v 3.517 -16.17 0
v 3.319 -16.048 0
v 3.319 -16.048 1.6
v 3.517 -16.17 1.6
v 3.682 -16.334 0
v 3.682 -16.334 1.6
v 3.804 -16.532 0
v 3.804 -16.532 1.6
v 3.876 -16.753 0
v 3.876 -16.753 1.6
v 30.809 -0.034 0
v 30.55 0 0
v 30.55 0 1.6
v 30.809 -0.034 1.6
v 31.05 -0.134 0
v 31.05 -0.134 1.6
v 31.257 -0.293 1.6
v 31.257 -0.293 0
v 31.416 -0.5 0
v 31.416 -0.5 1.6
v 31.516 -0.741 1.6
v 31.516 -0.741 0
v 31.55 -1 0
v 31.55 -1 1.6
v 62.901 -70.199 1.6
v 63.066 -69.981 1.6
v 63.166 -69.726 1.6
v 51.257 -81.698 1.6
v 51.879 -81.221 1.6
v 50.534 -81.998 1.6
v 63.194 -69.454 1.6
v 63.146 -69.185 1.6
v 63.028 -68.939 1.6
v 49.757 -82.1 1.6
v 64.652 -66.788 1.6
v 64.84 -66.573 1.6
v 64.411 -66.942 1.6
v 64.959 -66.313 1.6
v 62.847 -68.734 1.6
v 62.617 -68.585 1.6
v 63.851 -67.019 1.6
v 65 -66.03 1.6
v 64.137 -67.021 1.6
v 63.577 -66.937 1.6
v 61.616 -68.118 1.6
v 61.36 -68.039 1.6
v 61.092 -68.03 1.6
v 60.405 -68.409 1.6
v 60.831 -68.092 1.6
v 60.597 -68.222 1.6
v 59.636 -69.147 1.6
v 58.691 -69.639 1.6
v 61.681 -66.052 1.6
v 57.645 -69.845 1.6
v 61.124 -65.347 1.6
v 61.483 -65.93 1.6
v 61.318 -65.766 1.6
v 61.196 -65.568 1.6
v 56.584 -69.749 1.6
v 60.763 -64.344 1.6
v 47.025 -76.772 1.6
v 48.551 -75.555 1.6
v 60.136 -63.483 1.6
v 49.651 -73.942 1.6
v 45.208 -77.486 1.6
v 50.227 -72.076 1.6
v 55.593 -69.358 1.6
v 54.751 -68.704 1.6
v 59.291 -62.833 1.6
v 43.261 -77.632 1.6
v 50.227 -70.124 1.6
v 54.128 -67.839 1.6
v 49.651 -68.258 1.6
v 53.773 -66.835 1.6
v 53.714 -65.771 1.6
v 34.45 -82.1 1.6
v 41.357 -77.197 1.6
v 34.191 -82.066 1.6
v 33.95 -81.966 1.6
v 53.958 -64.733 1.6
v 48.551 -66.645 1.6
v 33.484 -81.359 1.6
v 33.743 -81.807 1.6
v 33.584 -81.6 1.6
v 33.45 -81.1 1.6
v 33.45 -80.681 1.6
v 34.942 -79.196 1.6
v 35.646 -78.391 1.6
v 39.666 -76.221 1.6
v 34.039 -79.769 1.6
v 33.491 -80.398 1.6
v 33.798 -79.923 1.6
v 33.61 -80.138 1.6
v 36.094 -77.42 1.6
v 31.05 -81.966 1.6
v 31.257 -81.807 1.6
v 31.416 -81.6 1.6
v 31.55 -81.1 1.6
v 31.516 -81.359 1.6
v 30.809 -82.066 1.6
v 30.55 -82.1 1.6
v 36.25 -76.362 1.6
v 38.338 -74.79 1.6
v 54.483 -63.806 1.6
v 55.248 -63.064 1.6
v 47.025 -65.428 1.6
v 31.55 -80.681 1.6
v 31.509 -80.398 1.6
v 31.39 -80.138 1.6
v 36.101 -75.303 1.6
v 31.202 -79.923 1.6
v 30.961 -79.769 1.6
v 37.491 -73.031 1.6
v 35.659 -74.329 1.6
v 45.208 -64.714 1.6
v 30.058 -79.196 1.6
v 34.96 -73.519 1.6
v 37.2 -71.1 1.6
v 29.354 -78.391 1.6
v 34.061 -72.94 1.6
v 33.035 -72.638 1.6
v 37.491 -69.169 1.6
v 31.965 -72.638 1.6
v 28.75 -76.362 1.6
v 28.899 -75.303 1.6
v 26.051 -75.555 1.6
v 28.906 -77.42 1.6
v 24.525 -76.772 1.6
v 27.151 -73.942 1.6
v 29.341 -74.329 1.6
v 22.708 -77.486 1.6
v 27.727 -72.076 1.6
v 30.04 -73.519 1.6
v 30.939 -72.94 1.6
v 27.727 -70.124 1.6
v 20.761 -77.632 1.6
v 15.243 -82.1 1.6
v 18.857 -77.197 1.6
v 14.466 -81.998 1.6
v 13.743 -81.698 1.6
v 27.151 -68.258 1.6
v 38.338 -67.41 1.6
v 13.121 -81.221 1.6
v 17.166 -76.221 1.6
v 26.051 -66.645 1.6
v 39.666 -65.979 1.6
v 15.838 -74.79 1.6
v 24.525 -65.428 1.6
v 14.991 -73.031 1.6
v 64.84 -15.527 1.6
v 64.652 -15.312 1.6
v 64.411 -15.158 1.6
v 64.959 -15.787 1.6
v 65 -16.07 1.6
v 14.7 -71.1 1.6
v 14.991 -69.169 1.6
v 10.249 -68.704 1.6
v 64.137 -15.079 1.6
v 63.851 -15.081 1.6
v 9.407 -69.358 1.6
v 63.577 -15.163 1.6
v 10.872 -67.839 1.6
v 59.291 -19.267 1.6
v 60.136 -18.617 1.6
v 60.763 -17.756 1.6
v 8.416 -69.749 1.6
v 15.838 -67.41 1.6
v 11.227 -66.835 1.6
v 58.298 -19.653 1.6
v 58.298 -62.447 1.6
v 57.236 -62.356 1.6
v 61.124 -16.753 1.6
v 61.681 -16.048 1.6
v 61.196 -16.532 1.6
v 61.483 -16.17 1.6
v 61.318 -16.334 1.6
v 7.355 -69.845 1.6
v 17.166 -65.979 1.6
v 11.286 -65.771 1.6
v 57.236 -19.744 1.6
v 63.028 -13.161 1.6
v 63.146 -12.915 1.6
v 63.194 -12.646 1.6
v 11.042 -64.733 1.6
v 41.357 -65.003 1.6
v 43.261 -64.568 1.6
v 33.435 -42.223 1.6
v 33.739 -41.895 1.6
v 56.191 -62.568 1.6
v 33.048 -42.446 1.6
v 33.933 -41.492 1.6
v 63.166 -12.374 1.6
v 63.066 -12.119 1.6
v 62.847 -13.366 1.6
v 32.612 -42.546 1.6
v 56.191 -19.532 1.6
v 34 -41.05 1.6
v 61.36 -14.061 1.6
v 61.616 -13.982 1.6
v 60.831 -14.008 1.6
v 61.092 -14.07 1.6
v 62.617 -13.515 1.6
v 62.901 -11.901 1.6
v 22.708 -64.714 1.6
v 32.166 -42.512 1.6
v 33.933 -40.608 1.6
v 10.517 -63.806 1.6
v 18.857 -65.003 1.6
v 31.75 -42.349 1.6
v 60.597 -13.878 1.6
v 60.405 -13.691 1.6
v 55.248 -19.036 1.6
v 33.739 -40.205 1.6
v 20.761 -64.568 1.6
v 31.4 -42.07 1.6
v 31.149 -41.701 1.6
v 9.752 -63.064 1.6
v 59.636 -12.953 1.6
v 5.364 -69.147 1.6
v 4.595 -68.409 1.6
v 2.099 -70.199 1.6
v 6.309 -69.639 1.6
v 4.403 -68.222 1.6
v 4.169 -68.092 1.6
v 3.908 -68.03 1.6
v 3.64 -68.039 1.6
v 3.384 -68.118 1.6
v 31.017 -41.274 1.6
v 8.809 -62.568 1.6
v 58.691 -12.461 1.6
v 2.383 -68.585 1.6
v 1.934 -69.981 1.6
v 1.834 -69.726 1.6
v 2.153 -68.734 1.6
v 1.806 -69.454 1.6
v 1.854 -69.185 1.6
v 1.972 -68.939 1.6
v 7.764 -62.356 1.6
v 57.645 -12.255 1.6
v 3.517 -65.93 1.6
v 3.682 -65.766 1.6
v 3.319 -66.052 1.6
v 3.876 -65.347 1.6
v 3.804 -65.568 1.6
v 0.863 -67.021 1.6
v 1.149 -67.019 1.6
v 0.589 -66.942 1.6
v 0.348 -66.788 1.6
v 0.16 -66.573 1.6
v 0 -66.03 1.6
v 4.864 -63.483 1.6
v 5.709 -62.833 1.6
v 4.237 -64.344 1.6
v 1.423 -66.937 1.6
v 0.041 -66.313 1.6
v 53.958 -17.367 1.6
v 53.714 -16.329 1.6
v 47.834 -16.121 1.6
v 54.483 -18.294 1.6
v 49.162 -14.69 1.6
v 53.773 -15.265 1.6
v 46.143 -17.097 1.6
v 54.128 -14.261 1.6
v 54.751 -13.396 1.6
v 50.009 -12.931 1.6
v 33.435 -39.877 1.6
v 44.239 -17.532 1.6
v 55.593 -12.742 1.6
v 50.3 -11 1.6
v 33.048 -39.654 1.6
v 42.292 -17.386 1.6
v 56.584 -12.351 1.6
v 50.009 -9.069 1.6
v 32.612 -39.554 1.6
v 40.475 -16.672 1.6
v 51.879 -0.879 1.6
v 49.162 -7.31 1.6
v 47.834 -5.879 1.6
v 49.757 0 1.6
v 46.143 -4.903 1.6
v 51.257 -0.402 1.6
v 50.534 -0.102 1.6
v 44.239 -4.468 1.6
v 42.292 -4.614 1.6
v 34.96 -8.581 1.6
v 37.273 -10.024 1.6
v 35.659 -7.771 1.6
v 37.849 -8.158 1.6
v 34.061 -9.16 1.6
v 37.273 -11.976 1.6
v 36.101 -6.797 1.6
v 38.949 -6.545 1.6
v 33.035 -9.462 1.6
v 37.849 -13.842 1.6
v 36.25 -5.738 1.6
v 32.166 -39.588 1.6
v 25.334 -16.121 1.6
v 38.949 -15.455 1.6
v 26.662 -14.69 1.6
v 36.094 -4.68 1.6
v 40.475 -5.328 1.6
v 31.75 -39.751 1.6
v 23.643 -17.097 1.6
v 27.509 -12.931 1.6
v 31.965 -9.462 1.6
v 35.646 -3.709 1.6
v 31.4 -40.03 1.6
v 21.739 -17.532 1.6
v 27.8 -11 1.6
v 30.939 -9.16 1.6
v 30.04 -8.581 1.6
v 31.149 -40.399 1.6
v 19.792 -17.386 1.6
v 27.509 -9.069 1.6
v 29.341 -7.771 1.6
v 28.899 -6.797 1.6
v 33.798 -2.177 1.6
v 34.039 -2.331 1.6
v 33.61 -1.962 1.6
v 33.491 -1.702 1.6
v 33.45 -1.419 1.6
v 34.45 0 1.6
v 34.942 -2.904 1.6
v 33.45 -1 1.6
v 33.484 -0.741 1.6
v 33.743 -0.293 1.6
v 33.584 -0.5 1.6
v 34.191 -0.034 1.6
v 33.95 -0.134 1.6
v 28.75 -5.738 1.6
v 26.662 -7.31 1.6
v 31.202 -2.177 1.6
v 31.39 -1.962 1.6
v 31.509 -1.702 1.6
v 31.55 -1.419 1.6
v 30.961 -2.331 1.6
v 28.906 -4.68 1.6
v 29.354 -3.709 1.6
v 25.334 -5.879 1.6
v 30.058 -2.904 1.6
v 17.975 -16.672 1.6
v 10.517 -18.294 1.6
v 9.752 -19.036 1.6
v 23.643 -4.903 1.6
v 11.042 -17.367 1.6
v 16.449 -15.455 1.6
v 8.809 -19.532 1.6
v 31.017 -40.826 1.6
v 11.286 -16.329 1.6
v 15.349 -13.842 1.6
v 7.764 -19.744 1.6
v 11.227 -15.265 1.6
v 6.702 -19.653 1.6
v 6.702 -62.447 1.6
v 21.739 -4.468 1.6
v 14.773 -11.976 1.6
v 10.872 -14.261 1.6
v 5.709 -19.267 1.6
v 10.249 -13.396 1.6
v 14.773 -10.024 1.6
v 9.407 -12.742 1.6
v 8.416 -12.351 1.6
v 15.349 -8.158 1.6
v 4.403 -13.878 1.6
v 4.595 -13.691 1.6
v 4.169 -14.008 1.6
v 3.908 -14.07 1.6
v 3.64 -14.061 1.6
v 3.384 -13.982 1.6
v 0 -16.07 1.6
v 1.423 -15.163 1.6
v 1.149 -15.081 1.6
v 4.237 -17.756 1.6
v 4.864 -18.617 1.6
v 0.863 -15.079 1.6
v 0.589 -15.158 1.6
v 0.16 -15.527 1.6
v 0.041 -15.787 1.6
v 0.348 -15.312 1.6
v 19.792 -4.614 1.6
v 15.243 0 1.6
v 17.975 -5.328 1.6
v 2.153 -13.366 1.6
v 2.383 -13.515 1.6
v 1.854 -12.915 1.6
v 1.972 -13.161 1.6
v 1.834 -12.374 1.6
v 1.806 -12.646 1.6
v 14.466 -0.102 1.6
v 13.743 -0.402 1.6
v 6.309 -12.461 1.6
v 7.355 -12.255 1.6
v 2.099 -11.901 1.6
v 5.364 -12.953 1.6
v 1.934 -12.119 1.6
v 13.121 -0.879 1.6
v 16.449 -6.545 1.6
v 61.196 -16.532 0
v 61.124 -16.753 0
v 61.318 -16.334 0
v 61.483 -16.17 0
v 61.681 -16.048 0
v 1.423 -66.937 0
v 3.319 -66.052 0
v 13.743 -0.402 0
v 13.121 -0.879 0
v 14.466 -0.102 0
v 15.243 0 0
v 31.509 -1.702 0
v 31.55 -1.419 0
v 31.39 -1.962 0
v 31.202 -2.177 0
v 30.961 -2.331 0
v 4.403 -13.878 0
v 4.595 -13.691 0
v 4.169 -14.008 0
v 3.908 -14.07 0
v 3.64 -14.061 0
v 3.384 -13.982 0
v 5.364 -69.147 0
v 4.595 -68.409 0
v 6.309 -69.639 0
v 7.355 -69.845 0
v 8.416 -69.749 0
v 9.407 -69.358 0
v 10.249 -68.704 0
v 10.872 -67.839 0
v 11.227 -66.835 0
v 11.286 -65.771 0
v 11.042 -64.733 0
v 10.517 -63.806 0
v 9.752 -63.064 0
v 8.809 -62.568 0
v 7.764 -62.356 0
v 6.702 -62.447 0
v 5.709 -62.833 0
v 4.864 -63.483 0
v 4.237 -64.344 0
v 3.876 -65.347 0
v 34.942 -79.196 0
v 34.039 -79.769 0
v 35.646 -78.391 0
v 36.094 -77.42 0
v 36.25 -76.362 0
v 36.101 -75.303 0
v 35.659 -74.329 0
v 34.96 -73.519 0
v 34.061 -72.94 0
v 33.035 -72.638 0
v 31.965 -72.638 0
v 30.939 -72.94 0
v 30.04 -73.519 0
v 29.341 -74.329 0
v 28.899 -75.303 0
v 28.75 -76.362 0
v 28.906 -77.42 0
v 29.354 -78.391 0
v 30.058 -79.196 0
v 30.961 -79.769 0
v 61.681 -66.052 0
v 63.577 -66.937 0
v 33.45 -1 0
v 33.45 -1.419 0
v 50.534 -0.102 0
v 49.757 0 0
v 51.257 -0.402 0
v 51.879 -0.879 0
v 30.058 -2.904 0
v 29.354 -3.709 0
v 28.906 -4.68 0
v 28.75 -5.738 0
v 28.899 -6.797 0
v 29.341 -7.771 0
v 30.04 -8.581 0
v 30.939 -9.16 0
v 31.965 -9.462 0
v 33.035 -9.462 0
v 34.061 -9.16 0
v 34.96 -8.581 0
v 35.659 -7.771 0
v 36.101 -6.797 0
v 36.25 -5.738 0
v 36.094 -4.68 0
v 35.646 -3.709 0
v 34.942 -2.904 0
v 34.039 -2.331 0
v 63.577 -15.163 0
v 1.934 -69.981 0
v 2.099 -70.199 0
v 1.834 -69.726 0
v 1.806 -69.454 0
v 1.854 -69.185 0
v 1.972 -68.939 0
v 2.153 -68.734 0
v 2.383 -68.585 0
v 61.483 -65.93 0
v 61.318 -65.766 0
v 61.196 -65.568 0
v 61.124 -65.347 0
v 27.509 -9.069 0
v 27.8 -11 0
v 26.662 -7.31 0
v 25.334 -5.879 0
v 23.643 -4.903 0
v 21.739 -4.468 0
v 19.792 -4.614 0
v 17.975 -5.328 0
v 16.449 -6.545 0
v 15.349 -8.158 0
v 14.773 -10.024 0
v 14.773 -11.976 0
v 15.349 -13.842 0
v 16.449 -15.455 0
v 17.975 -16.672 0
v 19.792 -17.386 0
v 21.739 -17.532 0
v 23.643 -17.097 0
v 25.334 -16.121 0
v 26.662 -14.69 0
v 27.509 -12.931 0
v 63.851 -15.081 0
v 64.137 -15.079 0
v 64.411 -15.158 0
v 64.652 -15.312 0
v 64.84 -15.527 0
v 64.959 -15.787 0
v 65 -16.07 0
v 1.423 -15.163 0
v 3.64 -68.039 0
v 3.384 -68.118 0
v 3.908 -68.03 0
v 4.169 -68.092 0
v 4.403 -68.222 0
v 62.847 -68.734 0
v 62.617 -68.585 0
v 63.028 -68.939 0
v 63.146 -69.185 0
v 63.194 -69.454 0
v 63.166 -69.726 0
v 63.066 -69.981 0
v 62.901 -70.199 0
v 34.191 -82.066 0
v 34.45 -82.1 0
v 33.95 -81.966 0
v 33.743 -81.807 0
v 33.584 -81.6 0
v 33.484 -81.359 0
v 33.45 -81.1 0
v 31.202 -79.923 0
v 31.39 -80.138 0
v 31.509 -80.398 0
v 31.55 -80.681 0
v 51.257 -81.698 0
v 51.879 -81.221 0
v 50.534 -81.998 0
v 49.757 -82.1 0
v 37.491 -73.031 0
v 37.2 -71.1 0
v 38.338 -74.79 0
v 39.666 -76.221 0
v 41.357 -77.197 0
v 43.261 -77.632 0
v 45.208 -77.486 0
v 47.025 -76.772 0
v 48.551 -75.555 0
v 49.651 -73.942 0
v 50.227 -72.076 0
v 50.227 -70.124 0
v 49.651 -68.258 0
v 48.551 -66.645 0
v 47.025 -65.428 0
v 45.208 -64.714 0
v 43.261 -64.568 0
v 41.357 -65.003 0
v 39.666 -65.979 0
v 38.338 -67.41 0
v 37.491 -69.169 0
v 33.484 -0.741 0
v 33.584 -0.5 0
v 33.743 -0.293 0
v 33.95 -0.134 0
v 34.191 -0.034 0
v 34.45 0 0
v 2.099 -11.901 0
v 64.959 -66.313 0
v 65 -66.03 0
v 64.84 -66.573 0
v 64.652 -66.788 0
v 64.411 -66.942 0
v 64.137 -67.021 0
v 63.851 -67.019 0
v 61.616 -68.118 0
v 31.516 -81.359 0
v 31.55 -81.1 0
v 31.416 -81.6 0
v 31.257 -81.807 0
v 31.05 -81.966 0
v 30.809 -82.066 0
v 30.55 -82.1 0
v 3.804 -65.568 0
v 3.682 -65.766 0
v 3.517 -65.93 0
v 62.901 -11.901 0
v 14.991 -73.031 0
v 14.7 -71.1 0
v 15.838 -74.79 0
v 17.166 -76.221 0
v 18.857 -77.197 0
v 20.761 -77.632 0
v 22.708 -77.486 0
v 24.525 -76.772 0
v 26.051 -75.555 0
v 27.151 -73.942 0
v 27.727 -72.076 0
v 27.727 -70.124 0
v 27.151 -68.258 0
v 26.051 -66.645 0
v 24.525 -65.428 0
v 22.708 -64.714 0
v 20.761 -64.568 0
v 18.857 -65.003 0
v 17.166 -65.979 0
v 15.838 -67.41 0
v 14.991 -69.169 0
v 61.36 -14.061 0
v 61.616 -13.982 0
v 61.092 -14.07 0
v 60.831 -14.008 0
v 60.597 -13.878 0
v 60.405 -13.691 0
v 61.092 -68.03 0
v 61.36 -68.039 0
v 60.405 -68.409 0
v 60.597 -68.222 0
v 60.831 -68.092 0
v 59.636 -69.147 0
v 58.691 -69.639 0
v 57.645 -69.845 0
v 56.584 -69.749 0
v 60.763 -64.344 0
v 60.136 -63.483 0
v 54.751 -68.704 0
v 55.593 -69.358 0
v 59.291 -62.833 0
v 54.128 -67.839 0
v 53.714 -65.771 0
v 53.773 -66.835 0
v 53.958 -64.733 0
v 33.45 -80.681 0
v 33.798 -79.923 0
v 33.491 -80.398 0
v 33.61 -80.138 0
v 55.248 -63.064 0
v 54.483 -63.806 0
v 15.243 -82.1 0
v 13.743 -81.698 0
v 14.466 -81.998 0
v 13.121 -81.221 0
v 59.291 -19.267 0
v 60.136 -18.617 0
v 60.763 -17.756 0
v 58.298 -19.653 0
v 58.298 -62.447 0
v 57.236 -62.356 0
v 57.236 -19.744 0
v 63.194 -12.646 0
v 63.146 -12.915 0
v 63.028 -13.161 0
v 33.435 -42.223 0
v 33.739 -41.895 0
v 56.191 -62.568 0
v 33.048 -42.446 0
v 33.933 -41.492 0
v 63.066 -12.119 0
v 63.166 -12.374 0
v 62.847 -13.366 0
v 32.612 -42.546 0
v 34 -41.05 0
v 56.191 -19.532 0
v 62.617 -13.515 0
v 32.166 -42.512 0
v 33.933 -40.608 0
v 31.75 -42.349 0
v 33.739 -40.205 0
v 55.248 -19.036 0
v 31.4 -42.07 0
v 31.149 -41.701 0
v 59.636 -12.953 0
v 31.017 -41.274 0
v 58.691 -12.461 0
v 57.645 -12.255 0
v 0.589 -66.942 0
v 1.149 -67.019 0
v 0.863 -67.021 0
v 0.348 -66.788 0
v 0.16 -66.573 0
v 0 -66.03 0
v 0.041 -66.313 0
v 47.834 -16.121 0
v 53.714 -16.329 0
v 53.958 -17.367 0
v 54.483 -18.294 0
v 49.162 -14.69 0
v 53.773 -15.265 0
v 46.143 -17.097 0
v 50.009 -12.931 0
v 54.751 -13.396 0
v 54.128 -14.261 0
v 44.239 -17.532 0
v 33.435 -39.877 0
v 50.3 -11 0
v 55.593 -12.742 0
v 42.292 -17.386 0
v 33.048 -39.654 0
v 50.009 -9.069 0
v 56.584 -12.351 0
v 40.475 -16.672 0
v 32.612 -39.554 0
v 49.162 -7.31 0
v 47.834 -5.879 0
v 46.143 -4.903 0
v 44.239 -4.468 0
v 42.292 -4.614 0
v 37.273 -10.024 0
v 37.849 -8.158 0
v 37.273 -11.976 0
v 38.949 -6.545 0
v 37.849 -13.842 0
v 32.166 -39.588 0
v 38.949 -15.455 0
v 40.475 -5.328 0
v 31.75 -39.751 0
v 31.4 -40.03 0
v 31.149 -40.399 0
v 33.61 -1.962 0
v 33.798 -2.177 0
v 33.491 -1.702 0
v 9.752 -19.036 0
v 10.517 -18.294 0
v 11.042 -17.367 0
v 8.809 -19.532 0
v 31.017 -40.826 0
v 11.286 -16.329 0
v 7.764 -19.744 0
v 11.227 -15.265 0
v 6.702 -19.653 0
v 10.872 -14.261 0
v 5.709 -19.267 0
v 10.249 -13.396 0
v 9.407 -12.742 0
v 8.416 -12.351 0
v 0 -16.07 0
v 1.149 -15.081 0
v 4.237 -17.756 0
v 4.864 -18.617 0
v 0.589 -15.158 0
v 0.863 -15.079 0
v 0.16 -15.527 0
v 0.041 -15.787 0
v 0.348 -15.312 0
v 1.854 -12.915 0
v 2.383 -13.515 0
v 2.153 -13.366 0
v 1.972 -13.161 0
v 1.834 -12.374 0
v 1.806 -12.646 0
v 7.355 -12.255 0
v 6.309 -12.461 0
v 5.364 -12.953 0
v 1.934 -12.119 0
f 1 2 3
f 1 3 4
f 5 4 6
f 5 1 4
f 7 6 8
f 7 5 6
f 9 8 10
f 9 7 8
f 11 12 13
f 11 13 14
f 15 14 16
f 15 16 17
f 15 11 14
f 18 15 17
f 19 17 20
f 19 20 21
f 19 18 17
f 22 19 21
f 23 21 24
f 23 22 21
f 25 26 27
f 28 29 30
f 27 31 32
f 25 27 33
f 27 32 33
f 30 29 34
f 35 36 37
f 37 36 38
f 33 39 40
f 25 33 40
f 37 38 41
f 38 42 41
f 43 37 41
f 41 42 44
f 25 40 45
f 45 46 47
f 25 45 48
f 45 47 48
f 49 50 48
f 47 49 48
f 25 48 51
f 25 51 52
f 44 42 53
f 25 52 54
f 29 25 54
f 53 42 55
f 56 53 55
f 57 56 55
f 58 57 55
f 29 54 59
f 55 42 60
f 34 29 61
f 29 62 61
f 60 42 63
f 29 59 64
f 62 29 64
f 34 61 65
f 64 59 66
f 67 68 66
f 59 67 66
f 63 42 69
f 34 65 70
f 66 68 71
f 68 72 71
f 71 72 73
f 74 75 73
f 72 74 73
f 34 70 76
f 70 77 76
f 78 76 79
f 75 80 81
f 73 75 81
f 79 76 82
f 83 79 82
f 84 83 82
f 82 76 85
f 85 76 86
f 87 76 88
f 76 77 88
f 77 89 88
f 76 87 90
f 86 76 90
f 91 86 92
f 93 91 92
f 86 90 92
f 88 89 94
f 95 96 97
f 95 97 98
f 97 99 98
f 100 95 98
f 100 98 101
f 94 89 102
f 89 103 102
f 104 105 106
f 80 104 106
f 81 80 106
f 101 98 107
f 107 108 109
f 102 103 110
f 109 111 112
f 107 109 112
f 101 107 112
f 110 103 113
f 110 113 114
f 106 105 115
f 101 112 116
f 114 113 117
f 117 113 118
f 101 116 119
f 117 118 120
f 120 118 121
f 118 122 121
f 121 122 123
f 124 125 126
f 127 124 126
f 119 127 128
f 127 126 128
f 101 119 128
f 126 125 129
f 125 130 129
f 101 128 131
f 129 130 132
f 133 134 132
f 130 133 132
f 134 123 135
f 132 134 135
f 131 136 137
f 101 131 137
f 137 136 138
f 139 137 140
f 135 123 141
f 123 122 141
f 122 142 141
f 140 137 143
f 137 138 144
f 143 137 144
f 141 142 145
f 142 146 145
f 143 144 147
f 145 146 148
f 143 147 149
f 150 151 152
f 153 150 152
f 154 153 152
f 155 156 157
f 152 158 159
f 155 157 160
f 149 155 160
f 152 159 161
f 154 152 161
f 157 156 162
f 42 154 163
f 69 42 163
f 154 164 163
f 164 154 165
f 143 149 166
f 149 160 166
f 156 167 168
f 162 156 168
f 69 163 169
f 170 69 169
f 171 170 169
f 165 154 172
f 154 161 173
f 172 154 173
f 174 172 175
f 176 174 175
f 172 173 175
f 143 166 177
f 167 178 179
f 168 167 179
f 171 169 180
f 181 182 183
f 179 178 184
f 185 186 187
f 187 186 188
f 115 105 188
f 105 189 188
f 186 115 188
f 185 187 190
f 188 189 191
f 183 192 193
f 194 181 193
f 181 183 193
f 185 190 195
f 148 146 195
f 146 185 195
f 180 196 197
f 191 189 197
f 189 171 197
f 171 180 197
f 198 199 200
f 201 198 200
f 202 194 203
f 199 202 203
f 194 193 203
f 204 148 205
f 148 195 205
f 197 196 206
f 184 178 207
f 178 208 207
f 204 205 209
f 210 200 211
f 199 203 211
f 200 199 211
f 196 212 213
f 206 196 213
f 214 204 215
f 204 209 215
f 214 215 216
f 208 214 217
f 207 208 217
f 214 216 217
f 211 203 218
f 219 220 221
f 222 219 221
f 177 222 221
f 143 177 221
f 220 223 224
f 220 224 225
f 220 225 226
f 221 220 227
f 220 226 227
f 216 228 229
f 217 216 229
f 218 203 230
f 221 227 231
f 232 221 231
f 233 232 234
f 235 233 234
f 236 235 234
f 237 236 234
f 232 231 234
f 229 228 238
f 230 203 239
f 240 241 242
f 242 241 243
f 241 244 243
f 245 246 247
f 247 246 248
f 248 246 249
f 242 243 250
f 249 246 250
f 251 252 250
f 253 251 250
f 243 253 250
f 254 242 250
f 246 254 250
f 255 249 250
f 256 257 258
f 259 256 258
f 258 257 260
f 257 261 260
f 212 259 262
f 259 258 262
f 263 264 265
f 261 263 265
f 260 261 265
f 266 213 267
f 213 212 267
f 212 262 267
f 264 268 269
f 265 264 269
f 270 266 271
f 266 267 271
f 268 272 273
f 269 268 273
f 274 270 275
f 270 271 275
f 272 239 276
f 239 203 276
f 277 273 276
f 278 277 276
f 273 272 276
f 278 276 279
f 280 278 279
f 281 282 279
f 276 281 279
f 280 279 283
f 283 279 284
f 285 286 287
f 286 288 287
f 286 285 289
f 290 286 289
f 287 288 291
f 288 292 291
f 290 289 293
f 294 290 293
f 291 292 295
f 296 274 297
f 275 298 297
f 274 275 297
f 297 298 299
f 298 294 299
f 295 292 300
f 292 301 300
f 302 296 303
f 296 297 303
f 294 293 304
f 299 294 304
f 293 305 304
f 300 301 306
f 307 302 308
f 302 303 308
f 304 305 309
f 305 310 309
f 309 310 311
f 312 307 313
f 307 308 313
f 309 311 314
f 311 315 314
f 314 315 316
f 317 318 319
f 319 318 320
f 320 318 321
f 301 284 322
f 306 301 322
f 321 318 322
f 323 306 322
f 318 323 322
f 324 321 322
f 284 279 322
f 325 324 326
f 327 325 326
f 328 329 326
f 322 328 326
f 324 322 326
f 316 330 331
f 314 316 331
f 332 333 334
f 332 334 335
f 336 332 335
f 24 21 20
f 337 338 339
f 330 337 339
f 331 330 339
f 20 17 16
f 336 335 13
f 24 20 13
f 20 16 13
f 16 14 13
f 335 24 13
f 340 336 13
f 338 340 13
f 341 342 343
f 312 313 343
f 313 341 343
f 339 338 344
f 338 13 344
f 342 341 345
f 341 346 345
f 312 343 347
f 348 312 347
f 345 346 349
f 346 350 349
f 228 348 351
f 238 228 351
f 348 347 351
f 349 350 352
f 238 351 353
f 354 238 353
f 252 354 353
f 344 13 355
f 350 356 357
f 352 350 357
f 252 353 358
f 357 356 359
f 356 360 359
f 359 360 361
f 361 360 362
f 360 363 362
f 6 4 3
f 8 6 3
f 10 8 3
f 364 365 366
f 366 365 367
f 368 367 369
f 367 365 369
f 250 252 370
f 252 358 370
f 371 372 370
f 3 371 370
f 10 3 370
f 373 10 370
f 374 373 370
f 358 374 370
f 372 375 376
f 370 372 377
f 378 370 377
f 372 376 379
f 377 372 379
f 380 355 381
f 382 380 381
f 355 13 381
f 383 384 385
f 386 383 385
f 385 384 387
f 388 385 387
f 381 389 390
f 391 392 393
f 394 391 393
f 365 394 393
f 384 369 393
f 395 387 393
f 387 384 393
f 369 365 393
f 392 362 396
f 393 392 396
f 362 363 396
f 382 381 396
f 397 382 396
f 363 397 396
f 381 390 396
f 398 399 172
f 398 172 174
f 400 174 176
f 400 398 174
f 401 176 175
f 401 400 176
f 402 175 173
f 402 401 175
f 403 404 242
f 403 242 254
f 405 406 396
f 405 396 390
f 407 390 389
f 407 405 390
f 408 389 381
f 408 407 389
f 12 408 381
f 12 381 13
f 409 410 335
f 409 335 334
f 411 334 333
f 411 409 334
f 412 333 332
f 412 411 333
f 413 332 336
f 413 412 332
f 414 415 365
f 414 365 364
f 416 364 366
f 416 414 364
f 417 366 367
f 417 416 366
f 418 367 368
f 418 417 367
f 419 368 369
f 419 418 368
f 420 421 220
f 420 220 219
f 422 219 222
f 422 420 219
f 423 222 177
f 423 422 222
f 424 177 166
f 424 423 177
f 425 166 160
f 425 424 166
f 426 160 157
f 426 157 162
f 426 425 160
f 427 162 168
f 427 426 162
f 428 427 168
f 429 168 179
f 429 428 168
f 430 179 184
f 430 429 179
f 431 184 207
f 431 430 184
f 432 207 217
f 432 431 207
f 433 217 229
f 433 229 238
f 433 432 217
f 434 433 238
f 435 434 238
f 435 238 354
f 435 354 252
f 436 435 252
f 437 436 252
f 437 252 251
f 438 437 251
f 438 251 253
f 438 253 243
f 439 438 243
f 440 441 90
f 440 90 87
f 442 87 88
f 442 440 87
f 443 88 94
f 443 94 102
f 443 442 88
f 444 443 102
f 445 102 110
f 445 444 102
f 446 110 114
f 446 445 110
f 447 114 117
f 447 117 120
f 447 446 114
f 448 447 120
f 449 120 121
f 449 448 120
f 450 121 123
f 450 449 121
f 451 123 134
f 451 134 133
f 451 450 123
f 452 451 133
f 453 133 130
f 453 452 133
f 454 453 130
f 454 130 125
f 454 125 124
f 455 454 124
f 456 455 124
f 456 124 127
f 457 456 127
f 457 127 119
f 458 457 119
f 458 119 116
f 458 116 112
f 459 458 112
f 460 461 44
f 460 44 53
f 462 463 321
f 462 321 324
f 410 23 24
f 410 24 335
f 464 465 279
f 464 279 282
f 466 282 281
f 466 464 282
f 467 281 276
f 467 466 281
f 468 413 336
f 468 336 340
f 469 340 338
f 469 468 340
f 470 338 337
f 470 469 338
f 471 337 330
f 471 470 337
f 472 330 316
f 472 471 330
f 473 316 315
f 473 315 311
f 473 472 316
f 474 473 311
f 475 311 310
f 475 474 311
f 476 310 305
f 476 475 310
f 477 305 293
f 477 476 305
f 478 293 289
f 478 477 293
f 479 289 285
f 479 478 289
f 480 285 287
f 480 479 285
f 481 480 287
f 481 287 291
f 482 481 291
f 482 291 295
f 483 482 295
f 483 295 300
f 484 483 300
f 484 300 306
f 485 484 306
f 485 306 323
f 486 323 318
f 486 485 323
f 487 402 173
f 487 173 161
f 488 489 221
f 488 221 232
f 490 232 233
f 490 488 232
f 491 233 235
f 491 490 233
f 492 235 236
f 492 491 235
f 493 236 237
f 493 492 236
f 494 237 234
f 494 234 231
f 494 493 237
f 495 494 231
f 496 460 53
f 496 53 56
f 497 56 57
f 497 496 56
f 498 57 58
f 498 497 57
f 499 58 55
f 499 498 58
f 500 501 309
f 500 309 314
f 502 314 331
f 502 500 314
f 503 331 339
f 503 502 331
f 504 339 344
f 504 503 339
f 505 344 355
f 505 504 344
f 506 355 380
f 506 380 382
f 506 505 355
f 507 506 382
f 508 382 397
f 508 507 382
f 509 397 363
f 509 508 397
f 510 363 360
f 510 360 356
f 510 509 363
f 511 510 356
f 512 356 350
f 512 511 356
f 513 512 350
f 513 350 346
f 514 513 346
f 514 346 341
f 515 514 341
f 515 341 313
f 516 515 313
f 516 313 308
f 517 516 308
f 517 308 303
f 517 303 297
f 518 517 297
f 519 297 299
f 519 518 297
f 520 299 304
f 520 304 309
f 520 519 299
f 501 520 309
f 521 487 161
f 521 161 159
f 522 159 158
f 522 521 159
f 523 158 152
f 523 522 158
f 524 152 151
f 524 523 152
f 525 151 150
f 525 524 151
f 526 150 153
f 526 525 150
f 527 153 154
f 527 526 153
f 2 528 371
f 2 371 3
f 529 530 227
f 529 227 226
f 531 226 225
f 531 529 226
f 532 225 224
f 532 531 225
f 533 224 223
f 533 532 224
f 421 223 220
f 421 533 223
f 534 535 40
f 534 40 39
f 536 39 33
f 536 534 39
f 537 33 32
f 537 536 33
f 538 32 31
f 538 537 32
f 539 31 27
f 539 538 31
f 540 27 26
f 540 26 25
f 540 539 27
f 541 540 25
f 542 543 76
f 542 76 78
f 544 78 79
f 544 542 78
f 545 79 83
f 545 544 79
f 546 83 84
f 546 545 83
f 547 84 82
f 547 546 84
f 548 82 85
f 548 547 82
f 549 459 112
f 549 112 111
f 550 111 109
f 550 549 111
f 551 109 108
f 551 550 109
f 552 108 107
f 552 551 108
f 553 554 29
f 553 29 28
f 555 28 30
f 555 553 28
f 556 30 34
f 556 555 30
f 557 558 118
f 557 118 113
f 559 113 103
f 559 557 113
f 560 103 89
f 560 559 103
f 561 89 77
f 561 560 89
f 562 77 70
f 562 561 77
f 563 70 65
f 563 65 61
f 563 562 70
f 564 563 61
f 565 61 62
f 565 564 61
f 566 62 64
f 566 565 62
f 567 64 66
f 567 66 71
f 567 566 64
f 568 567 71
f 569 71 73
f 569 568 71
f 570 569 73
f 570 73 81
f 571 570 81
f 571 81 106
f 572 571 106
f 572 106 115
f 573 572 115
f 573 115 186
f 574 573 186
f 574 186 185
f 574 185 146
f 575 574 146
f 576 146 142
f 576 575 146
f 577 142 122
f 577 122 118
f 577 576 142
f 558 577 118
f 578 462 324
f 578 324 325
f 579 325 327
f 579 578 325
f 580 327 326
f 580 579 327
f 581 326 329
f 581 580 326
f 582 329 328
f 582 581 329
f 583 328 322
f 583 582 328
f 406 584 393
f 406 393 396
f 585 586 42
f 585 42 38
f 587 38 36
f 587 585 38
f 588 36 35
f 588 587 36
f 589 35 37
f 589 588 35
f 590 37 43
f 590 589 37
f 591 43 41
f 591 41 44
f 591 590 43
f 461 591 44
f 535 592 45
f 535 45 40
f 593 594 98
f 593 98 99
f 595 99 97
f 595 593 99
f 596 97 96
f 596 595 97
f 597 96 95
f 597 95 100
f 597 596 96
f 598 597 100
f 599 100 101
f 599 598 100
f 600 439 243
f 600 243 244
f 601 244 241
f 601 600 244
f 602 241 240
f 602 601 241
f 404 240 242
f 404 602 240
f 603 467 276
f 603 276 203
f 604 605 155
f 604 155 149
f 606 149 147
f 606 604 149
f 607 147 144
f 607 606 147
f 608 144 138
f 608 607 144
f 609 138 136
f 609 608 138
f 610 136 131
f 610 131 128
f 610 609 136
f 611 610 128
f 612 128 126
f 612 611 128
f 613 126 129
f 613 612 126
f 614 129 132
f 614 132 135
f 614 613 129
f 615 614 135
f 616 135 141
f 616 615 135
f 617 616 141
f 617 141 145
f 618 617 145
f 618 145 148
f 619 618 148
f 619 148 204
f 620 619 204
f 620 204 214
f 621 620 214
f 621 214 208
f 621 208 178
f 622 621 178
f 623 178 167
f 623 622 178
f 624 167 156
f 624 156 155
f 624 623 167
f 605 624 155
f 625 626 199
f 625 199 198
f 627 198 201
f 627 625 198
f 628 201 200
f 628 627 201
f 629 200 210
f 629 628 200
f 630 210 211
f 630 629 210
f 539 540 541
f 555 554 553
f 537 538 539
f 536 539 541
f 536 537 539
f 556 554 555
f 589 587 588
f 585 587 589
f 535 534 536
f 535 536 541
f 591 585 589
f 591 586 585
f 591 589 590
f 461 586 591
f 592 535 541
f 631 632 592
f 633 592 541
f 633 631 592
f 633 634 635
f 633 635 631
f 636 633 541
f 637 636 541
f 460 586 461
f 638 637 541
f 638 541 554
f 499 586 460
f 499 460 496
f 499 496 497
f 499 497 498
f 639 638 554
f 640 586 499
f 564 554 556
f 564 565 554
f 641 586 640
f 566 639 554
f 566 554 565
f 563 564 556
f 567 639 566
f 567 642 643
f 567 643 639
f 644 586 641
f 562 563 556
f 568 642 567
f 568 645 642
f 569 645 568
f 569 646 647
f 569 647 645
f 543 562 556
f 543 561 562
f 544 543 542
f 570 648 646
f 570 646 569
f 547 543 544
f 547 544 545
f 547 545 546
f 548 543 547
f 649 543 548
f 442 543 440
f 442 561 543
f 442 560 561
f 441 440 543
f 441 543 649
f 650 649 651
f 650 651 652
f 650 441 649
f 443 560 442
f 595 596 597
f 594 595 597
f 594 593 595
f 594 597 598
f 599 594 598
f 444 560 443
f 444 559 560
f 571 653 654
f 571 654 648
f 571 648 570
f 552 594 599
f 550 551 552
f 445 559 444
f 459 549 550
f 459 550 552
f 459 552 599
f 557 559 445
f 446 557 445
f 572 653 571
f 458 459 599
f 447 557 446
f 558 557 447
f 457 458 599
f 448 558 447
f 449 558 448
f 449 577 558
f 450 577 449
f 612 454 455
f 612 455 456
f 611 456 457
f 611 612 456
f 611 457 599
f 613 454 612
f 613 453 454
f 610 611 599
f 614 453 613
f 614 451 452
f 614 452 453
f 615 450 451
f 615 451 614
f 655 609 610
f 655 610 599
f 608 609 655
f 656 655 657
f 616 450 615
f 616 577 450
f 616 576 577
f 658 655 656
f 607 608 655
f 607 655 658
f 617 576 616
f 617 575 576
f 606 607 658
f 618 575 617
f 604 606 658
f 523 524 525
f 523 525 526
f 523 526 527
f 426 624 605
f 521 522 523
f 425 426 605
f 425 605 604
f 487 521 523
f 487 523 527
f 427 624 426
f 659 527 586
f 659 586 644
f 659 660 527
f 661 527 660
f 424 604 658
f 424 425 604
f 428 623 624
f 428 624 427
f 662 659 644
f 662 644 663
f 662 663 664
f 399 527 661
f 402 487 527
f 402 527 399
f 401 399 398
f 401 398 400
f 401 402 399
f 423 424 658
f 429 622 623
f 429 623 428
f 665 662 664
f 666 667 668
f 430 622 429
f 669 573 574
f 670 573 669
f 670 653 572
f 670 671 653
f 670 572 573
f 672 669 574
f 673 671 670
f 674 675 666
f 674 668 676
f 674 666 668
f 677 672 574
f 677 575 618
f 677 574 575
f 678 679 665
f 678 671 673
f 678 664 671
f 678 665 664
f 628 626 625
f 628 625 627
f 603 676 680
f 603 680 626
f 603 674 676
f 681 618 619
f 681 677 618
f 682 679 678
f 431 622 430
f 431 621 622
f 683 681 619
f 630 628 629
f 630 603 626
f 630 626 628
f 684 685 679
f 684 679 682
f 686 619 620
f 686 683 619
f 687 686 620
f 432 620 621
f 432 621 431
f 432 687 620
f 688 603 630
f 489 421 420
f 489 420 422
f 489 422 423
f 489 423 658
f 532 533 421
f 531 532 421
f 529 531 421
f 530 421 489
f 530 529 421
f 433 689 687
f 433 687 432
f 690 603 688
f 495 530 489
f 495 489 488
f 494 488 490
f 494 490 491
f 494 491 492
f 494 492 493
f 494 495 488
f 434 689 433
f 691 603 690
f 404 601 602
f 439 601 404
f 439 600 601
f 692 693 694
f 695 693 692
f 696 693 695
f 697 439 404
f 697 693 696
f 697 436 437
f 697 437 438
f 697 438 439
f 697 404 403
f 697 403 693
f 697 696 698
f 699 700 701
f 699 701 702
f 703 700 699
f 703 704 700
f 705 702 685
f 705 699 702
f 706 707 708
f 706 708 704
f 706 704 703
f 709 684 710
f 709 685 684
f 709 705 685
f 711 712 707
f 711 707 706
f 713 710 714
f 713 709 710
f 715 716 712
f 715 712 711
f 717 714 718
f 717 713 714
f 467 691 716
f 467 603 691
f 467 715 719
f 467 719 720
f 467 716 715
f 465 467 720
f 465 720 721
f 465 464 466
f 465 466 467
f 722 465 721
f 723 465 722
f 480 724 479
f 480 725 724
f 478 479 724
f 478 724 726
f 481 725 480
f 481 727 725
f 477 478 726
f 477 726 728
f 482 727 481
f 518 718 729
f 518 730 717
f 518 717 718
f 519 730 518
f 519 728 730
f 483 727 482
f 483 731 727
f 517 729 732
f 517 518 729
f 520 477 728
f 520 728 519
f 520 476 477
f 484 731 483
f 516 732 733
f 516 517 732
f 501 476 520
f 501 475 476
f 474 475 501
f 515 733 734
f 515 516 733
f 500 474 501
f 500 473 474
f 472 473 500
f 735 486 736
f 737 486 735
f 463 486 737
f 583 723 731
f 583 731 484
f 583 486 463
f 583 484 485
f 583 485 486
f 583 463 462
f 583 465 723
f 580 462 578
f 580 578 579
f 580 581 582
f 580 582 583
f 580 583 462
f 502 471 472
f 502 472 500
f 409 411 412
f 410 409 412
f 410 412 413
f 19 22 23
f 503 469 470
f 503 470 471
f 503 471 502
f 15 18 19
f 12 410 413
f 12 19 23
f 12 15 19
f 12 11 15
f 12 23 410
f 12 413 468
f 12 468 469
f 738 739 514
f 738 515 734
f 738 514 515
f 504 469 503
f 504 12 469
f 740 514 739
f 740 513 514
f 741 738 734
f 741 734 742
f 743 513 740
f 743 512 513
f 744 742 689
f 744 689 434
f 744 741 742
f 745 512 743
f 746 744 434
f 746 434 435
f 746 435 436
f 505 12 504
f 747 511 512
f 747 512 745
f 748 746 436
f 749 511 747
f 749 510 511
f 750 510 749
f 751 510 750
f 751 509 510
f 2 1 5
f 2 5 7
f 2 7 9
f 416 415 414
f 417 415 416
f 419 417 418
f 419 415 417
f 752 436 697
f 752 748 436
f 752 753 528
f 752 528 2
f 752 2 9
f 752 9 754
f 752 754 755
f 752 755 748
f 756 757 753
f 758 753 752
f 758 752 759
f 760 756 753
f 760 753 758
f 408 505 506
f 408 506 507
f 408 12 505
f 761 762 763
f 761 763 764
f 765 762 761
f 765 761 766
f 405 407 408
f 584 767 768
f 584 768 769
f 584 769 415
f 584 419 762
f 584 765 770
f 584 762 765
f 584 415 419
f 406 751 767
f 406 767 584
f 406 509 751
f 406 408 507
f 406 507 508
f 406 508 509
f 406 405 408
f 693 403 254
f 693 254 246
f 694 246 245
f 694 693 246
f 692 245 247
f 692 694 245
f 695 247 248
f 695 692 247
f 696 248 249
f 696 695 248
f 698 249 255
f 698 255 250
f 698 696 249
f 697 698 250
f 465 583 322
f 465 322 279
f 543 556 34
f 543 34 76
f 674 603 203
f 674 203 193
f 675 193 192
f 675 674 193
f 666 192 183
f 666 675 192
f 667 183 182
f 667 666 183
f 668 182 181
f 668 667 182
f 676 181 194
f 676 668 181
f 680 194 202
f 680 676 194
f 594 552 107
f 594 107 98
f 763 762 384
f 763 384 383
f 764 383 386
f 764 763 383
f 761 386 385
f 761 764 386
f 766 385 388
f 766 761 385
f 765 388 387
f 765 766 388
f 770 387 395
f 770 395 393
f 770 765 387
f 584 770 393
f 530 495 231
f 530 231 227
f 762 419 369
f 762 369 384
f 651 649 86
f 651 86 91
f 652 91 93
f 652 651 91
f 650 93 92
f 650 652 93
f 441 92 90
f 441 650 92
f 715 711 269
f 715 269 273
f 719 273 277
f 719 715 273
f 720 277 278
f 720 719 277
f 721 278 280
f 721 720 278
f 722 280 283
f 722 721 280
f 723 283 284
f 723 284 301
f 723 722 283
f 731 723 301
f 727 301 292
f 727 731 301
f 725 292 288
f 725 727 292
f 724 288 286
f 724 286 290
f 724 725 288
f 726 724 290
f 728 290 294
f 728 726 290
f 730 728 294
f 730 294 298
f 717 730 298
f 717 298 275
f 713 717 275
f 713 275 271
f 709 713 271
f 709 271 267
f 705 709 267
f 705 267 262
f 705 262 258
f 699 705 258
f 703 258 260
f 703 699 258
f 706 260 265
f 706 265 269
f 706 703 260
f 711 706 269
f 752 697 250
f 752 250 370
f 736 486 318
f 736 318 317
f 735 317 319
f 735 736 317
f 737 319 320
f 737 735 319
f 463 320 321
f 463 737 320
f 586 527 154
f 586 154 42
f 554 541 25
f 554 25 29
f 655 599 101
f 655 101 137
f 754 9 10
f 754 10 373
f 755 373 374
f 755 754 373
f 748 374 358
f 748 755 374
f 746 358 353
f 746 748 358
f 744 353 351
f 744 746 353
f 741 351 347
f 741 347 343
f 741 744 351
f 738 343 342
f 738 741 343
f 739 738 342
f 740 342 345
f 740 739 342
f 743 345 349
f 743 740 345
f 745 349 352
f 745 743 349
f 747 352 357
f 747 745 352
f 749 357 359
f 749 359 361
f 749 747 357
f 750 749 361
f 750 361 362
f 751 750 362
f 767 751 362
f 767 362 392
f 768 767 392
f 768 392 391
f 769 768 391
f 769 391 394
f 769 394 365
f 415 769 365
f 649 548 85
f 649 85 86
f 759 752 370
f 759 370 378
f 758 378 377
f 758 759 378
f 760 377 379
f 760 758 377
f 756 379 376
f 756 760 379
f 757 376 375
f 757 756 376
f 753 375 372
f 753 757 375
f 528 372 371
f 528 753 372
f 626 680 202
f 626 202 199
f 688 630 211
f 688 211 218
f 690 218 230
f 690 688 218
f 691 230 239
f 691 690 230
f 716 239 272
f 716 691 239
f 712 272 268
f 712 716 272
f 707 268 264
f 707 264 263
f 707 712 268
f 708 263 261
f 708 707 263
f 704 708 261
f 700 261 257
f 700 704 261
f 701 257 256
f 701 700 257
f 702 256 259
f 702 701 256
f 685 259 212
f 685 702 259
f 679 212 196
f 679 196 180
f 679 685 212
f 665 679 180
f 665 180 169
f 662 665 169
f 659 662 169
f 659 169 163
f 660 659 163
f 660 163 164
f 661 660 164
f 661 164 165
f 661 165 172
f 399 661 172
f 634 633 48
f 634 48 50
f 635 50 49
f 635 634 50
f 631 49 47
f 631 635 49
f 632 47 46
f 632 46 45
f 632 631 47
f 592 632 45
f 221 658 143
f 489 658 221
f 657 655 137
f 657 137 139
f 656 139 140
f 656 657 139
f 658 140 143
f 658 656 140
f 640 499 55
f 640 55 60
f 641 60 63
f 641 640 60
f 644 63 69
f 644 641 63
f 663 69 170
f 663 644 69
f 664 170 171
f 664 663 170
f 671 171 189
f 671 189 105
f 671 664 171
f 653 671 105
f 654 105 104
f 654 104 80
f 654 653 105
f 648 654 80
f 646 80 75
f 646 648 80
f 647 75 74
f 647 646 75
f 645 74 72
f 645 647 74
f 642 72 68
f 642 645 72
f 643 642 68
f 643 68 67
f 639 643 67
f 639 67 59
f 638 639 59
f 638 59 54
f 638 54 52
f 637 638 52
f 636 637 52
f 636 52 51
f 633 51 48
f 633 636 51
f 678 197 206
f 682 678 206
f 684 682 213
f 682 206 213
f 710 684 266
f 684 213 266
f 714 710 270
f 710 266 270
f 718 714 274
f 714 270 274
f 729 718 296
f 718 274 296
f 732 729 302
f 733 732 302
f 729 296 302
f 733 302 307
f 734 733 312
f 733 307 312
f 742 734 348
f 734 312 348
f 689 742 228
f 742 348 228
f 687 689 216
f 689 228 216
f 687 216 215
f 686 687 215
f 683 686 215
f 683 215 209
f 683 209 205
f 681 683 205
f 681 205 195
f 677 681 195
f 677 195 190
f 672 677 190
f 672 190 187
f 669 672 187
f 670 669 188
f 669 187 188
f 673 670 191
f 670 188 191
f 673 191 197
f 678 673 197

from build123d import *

# Parameters (mm, degrees)
IZIM1_R                     = 6.55
Y_KSEKLIK_EKSTR_ZYON1_DEPTH = 1.6
IZIM2_R                     = 1.5
KES_EKSTR_ZYON1_DEPTH       = 1.6


with BuildPart() as part:
    # Çizim1 → Yükseklik-Ekstrüzyon1 (new body)
    with BuildSketch(Plane.XY):
        with BuildLine():
            Line((51.878679656, -0.878679656), (62.901413512, -11.901413512))
            ThreePointArc((62.901413512, -11.901413512), (63.179114484, -12.782168471), (62.616924992, -13.51482808))
            Line((62.616924992, -13.51482808), (61.615557944, -13.981773203))
            ThreePointArc((61.615557944, -13.981773203), (60.959512838, -14.047839782), (60.404952381, -13.691156907))
            ThreePointArc((60.404952381, -13.691156907), (53.799180994, -16.856750014), (61.123557768, -16.753308252))
            ThreePointArc((61.123557768, -16.753308252), (61.318334892, -16.334489822), (61.680554911, -16.047882666))
            Line((61.680554911, -16.047882666), (63.577381738, -15.16337779))
            ThreePointArc((63.577381738, -15.16337779), (64.537299608, -15.226294131), (65, -16.069685577))
            Line((65, -16.069685577), (65, -66.030314423))
            ThreePointArc((65, -66.030314423), (64.537299608, -66.873705869), (63.577381738, -66.93662221))
            Line((63.577381738, -66.93662221), (61.680554911, -66.052117334))
            ThreePointArc((61.680554911, -66.052117334), (61.318334892, -65.765510178), (61.123557768, -65.346691748))
            ThreePointArc((61.123557768, -65.346691748), (53.799180994, -65.243249986), (60.404952381, -68.408843093))
            ThreePointArc((60.404952381, -68.408843093), (60.959512838, -68.052160218), (61.615557944, -68.118226797))
            Line((61.615557944, -68.118226797), (62.616924992, -68.58517192))
            ThreePointArc((62.616924992, -68.58517192), (63.179114484, -69.317831529), (62.901413512, -70.198586488))
            Line((62.901413512, -70.198586488), (51.878679656, -81.221320344))
            ThreePointArc((51.878679656, -81.221320344), (50.90540961, -81.871638598), (49.757359313, -82.1))
            Line((49.757359313, -82.1), (34.45, -82.1))
            ThreePointArc((34.45, -82.1), (33.742893219, -81.807106781), (33.45, -81.1))
            Line((33.45, -81.1), (33.45, -80.681281566))
            ThreePointArc((33.45, -80.681281566), (33.610200525, -80.138384852), (34.039473684, -79.769432815))
            ThreePointArc((34.039473684, -79.769432815), (32.5, -72.6), (30.960526316, -79.769432815))
            ThreePointArc((30.960526316, -79.769432815), (31.389799475, -80.138384852), (31.55, -80.681281566))
            Line((31.55, -80.681281566), (31.55, -81.1))
            ThreePointArc((31.55, -81.1), (31.257106781, -81.807106781), (30.55, -82.1))
            Line((30.55, -82.1), (15.242640687, -82.1))
            ThreePointArc((15.242640687, -82.1), (14.09459039, -81.871638598), (13.121320344, -81.221320344))
            Line((13.121320344, -81.221320344), (2.098586488, -70.198586488))
            ThreePointArc((2.098586488, -70.198586488), (1.820885516, -69.317831529), (2.383075008, -68.58517192))
            Line((2.383075008, -68.58517192), (3.384442056, -68.118226797))
            ThreePointArc((3.384442056, -68.118226797), (4.040487162, -68.052160218), (4.595047619, -68.408843093))
            ThreePointArc((4.595047619, -68.408843093), (11.200819006, -65.243249986), (3.876442232, -65.346691748))
            ThreePointArc((3.876442232, -65.346691748), (3.681665108, -65.765510178), (3.319445089, -66.052117334))
            Line((3.319445089, -66.052117334), (1.422618262, -66.93662221))
            ThreePointArc((1.422618262, -66.93662221), (0.462700392, -66.873705869), (0, -66.030314423))
            Line((0, -66.030314423), (0, -16.069685577))
            ThreePointArc((0, -16.069685577), (0.462700392, -15.226294131), (1.422618262, -15.16337779))
            Line((1.422618262, -15.16337779), (3.319445089, -16.047882666))
            ThreePointArc((3.319445089, -16.047882666), (3.681665108, -16.334489822), (3.876442232, -16.753308252))
            ThreePointArc((3.876442232, -16.753308252), (11.200819006, -16.856750014), (4.595047619, -13.691156907))
            ThreePointArc((4.595047619, -13.691156907), (4.040487162, -14.047839782), (3.384442056, -13.981773203))
            Line((3.384442056, -13.981773203), (2.383075008, -13.51482808))
            ThreePointArc((2.383075008, -13.51482808), (1.820885516, -12.782168471), (2.098586488, -11.901413512))
            Line((2.098586488, -11.901413512), (13.121320344, -0.878679656))
            ThreePointArc((13.121320344, -0.878679656), (14.09459039, -0.228361402), (15.242640687, 0))
            Line((15.242640687, 0), (30.55, 0))
            ThreePointArc((30.55, 0), (31.257106781, -0.292893219), (31.55, -1))
            Line((31.55, -1), (31.55, -1.418718434))
            ThreePointArc((31.55, -1.418718434), (31.389799475, -1.961615148), (30.960526316, -2.330567185))
            ThreePointArc((30.960526316, -2.330567185), (32.5, -9.5), (34.039473684, -2.330567185))
            ThreePointArc((34.039473684, -2.330567185), (33.610200525, -1.961615148), (33.45, -1.418718434))
            Line((33.45, -1.418718434), (33.45, -1))
            ThreePointArc((33.45, -1), (33.742893219, -0.292893219), (34.45, 0))
            Line((34.45, 0), (49.757359313, 0))
            ThreePointArc((49.757359313, 0), (50.90540961, -0.228361402), (51.878679656, -0.878679656))
        make_face()
        with Locations((21.25, -11)):
            Circle(IZIM1_R, mode=Mode.SUBTRACT)
        with Locations((43.75, -11)):
            Circle(IZIM1_R, mode=Mode.SUBTRACT)
        with Locations(Location((43.75, -71.1, 0), (0, 0, 180))):
            Circle(IZIM1_R, mode=Mode.SUBTRACT)
        with Locations(Location((21.25, -71.1, 0), (0, 0, 180))):
            Circle(IZIM1_R, mode=Mode.SUBTRACT)
    extrude(amount=Y_KSEKLIK_EKSTR_ZYON1_DEPTH)

    # Çizim2 → Kes-Ekstrüzyon1 (cut)
    with BuildSketch(Plane.XY.offset(1.6)):
        with Locations((32.5, -41.05)):
            Circle(IZIM2_R)
    extrude(amount=-KES_EKSTR_ZYON1_DEPTH, mode=Mode.SUBTRACT)


solid = part.part
